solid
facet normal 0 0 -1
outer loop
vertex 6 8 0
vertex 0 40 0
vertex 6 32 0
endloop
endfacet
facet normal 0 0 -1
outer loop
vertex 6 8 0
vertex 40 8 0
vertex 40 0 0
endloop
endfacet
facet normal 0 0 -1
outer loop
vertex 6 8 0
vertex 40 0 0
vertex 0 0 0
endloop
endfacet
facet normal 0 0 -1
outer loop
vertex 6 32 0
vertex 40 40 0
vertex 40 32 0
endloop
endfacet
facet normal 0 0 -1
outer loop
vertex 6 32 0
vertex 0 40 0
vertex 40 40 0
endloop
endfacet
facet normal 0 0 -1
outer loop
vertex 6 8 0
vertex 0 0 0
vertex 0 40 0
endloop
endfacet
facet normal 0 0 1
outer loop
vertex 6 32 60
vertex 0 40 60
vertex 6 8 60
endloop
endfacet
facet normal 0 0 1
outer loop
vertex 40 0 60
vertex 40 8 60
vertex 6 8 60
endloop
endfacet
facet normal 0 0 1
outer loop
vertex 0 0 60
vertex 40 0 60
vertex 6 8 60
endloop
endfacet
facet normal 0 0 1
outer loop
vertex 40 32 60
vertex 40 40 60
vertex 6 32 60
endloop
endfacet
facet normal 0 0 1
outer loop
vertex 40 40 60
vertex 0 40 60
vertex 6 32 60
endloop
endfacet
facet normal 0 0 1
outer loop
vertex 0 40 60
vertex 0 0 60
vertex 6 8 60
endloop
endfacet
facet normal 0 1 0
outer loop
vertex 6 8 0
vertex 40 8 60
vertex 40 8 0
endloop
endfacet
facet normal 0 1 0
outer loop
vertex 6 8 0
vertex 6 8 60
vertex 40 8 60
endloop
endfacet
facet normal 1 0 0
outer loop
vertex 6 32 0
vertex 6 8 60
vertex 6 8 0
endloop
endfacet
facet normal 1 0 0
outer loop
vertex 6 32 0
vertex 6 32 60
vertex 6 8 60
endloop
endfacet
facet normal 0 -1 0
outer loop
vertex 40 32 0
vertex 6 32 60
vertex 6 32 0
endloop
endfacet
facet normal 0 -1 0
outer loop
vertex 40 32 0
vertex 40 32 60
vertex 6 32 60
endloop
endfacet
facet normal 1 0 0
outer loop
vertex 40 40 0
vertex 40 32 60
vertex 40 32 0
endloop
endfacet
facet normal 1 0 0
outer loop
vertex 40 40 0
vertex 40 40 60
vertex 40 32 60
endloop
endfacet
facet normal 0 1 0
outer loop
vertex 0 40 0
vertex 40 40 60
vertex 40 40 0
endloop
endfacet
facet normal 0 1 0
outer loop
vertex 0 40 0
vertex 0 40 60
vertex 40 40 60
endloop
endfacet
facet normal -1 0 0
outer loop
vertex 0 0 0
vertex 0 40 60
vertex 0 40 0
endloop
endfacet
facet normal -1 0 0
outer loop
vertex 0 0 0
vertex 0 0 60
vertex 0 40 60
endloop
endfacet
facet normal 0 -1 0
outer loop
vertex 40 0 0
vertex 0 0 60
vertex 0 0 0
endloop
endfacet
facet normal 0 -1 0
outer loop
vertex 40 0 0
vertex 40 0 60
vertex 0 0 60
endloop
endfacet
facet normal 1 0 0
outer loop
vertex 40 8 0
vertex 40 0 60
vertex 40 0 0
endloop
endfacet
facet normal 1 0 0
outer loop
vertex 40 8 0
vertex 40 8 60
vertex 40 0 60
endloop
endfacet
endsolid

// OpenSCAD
$fn = 32;

// ----------------------------------------------------------------------
// Structural section: channel 40 x 40 mm
// ----------------------------------------------------------------------

// --- parameters (mm) ---
sec_w = 40;               // channel width, X
sec_h = 40;               // channel height, Y
flange_t = 8;             // flange thickness
web_t = 6;                // web thickness
plate_t = 60;             // cut length, Z (extrusion height)
fit_tol = 0.02;           // declared fit tolerance (prompt contract)
free_tol = 0.2;           // declared free tolerance (prompt contract)

profile = [[0, 0], [40, 0], [40, 8], [6, 8], [6, 32], [40, 32], [40, 40], [0, 40]];  // primary outline, 8 points, counter clockwise

// --- the one profile operation ---
linear_extrude(height = plate_t) polygon(points = profile);
